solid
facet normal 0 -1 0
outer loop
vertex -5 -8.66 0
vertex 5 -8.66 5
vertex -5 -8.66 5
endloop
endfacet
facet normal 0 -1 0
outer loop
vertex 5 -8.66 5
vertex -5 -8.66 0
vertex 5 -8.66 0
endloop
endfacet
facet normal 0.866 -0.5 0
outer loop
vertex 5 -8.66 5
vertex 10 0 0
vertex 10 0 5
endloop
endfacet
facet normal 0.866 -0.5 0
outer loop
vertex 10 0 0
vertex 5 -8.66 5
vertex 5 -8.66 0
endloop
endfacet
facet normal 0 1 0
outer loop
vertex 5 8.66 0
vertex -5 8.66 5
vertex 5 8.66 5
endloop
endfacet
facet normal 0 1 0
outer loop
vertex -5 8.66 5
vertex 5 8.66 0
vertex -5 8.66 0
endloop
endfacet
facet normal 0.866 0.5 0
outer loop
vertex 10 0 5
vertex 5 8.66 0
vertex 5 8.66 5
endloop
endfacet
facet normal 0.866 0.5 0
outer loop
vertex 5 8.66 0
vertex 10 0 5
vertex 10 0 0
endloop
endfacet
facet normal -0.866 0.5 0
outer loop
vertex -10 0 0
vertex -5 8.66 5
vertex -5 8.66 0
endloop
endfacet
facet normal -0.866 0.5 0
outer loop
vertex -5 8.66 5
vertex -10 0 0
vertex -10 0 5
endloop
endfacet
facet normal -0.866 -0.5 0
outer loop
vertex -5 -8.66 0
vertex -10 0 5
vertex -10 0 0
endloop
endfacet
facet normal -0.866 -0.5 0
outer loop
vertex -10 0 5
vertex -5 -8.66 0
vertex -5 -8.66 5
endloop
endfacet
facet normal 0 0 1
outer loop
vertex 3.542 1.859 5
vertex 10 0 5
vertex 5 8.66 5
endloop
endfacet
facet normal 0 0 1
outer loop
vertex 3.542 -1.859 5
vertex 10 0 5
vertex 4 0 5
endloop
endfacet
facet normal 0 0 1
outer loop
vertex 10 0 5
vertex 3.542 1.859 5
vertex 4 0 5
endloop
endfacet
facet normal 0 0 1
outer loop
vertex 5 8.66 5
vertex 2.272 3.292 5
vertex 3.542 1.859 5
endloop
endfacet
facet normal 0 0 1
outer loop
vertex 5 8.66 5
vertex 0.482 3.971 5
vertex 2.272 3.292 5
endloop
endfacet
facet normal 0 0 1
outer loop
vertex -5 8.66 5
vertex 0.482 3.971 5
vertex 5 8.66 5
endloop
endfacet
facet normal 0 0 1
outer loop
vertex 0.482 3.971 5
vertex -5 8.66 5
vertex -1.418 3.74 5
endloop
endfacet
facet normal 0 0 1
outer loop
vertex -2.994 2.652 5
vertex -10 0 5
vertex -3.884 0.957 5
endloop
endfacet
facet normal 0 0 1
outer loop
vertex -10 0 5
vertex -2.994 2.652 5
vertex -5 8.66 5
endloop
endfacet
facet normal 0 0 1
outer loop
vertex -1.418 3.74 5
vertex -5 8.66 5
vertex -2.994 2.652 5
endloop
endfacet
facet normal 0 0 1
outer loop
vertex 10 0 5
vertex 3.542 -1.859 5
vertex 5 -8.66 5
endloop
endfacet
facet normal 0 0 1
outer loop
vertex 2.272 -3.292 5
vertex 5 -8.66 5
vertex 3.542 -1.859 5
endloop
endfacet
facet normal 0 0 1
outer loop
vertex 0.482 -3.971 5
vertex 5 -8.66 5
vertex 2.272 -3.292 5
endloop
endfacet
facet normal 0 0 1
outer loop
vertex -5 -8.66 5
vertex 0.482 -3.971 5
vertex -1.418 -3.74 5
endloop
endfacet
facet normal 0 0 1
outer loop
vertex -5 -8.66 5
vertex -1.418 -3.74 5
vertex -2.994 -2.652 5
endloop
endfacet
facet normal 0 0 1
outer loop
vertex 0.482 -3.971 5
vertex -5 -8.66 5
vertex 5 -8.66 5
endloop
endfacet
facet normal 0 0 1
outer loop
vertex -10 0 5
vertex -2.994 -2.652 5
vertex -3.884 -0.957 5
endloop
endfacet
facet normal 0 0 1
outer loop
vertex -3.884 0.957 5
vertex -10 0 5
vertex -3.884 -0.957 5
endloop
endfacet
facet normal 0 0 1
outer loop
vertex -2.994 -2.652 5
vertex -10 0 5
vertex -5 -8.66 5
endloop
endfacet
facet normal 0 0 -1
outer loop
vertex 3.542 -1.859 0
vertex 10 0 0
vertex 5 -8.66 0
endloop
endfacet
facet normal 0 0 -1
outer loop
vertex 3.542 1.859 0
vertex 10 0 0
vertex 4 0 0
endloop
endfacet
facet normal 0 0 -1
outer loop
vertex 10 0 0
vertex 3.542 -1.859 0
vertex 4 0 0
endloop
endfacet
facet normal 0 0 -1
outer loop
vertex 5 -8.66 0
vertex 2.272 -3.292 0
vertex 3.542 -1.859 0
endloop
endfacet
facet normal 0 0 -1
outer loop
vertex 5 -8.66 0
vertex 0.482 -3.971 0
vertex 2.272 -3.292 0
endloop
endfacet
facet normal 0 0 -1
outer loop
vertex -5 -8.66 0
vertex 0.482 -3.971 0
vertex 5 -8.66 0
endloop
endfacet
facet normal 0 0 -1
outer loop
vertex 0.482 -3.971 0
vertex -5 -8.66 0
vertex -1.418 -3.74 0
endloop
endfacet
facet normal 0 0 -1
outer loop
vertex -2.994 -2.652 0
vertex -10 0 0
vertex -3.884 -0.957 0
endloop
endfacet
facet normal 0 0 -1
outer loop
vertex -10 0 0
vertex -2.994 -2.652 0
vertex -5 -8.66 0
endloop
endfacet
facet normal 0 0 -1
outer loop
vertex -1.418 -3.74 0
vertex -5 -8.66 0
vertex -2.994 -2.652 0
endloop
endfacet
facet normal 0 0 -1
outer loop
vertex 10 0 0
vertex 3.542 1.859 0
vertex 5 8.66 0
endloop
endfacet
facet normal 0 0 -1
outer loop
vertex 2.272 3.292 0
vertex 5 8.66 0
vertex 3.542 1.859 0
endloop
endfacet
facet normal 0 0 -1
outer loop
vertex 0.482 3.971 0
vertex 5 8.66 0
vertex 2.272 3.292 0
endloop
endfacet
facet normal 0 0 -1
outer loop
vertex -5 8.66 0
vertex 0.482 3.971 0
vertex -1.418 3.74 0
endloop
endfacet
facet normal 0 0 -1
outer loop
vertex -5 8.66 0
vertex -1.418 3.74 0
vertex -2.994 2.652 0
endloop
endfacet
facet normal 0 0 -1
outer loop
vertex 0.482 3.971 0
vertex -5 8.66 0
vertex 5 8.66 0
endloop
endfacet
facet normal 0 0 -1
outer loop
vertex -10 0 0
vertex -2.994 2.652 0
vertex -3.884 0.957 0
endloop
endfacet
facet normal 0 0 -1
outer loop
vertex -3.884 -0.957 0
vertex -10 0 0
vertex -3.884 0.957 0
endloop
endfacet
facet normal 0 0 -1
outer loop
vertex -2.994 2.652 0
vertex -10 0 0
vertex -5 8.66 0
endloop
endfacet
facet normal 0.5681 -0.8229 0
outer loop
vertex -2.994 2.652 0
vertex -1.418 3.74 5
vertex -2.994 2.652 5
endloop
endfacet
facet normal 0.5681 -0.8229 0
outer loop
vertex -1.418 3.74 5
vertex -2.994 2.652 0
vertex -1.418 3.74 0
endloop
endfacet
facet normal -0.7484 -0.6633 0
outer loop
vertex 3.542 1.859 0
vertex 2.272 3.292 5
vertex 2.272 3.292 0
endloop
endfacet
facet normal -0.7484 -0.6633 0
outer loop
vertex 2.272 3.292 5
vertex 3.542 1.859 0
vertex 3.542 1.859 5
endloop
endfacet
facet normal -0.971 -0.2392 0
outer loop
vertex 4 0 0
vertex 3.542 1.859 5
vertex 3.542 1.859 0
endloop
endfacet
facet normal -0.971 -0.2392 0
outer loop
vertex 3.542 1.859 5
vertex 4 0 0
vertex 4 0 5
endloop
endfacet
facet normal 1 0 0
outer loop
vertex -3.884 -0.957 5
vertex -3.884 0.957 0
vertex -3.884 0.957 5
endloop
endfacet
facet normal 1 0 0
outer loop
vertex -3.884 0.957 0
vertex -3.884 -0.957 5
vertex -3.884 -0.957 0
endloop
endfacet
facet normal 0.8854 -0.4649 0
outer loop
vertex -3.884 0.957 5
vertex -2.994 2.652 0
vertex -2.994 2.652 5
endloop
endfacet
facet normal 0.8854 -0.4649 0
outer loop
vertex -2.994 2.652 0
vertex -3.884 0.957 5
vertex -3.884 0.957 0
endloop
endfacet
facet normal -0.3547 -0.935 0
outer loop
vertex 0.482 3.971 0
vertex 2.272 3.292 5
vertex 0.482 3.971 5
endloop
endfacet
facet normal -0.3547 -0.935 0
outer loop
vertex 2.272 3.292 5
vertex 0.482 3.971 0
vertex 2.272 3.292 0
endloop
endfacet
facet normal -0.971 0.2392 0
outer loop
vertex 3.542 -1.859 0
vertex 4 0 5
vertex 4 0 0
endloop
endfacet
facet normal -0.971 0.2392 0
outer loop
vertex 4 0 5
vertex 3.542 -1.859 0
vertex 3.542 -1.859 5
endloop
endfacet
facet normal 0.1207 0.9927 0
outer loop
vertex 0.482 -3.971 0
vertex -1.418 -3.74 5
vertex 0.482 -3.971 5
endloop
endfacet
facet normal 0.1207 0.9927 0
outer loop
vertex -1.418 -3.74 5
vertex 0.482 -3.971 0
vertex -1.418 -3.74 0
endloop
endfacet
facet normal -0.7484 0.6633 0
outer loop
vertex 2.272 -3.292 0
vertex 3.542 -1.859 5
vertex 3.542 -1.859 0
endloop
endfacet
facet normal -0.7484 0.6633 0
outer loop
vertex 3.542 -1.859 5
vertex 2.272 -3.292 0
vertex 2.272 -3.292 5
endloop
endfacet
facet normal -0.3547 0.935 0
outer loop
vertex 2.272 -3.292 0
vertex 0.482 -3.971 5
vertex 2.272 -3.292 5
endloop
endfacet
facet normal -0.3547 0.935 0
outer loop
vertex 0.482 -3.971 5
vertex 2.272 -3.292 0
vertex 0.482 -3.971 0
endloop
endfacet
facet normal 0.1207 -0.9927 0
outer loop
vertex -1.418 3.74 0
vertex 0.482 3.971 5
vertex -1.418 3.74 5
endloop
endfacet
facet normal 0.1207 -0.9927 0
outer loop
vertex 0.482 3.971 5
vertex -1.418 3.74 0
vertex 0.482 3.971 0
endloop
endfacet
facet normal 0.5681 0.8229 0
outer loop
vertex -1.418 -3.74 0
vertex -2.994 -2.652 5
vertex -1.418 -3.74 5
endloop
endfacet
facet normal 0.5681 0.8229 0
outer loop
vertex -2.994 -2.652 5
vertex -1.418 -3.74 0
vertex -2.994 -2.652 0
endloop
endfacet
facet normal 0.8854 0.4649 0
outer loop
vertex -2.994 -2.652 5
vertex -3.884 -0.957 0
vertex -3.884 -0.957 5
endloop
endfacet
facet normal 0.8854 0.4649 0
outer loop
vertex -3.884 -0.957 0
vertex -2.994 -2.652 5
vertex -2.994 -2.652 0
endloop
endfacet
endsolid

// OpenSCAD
// The exact-geometry audit's case c11 (docs/audits/exact-geometry-rust.md).
// volume: 1047.7106933894745
difference() { cylinder(r=10, h=5, $fn=6); translate([0,0,-1]) cylinder(r=4, h=7); }
